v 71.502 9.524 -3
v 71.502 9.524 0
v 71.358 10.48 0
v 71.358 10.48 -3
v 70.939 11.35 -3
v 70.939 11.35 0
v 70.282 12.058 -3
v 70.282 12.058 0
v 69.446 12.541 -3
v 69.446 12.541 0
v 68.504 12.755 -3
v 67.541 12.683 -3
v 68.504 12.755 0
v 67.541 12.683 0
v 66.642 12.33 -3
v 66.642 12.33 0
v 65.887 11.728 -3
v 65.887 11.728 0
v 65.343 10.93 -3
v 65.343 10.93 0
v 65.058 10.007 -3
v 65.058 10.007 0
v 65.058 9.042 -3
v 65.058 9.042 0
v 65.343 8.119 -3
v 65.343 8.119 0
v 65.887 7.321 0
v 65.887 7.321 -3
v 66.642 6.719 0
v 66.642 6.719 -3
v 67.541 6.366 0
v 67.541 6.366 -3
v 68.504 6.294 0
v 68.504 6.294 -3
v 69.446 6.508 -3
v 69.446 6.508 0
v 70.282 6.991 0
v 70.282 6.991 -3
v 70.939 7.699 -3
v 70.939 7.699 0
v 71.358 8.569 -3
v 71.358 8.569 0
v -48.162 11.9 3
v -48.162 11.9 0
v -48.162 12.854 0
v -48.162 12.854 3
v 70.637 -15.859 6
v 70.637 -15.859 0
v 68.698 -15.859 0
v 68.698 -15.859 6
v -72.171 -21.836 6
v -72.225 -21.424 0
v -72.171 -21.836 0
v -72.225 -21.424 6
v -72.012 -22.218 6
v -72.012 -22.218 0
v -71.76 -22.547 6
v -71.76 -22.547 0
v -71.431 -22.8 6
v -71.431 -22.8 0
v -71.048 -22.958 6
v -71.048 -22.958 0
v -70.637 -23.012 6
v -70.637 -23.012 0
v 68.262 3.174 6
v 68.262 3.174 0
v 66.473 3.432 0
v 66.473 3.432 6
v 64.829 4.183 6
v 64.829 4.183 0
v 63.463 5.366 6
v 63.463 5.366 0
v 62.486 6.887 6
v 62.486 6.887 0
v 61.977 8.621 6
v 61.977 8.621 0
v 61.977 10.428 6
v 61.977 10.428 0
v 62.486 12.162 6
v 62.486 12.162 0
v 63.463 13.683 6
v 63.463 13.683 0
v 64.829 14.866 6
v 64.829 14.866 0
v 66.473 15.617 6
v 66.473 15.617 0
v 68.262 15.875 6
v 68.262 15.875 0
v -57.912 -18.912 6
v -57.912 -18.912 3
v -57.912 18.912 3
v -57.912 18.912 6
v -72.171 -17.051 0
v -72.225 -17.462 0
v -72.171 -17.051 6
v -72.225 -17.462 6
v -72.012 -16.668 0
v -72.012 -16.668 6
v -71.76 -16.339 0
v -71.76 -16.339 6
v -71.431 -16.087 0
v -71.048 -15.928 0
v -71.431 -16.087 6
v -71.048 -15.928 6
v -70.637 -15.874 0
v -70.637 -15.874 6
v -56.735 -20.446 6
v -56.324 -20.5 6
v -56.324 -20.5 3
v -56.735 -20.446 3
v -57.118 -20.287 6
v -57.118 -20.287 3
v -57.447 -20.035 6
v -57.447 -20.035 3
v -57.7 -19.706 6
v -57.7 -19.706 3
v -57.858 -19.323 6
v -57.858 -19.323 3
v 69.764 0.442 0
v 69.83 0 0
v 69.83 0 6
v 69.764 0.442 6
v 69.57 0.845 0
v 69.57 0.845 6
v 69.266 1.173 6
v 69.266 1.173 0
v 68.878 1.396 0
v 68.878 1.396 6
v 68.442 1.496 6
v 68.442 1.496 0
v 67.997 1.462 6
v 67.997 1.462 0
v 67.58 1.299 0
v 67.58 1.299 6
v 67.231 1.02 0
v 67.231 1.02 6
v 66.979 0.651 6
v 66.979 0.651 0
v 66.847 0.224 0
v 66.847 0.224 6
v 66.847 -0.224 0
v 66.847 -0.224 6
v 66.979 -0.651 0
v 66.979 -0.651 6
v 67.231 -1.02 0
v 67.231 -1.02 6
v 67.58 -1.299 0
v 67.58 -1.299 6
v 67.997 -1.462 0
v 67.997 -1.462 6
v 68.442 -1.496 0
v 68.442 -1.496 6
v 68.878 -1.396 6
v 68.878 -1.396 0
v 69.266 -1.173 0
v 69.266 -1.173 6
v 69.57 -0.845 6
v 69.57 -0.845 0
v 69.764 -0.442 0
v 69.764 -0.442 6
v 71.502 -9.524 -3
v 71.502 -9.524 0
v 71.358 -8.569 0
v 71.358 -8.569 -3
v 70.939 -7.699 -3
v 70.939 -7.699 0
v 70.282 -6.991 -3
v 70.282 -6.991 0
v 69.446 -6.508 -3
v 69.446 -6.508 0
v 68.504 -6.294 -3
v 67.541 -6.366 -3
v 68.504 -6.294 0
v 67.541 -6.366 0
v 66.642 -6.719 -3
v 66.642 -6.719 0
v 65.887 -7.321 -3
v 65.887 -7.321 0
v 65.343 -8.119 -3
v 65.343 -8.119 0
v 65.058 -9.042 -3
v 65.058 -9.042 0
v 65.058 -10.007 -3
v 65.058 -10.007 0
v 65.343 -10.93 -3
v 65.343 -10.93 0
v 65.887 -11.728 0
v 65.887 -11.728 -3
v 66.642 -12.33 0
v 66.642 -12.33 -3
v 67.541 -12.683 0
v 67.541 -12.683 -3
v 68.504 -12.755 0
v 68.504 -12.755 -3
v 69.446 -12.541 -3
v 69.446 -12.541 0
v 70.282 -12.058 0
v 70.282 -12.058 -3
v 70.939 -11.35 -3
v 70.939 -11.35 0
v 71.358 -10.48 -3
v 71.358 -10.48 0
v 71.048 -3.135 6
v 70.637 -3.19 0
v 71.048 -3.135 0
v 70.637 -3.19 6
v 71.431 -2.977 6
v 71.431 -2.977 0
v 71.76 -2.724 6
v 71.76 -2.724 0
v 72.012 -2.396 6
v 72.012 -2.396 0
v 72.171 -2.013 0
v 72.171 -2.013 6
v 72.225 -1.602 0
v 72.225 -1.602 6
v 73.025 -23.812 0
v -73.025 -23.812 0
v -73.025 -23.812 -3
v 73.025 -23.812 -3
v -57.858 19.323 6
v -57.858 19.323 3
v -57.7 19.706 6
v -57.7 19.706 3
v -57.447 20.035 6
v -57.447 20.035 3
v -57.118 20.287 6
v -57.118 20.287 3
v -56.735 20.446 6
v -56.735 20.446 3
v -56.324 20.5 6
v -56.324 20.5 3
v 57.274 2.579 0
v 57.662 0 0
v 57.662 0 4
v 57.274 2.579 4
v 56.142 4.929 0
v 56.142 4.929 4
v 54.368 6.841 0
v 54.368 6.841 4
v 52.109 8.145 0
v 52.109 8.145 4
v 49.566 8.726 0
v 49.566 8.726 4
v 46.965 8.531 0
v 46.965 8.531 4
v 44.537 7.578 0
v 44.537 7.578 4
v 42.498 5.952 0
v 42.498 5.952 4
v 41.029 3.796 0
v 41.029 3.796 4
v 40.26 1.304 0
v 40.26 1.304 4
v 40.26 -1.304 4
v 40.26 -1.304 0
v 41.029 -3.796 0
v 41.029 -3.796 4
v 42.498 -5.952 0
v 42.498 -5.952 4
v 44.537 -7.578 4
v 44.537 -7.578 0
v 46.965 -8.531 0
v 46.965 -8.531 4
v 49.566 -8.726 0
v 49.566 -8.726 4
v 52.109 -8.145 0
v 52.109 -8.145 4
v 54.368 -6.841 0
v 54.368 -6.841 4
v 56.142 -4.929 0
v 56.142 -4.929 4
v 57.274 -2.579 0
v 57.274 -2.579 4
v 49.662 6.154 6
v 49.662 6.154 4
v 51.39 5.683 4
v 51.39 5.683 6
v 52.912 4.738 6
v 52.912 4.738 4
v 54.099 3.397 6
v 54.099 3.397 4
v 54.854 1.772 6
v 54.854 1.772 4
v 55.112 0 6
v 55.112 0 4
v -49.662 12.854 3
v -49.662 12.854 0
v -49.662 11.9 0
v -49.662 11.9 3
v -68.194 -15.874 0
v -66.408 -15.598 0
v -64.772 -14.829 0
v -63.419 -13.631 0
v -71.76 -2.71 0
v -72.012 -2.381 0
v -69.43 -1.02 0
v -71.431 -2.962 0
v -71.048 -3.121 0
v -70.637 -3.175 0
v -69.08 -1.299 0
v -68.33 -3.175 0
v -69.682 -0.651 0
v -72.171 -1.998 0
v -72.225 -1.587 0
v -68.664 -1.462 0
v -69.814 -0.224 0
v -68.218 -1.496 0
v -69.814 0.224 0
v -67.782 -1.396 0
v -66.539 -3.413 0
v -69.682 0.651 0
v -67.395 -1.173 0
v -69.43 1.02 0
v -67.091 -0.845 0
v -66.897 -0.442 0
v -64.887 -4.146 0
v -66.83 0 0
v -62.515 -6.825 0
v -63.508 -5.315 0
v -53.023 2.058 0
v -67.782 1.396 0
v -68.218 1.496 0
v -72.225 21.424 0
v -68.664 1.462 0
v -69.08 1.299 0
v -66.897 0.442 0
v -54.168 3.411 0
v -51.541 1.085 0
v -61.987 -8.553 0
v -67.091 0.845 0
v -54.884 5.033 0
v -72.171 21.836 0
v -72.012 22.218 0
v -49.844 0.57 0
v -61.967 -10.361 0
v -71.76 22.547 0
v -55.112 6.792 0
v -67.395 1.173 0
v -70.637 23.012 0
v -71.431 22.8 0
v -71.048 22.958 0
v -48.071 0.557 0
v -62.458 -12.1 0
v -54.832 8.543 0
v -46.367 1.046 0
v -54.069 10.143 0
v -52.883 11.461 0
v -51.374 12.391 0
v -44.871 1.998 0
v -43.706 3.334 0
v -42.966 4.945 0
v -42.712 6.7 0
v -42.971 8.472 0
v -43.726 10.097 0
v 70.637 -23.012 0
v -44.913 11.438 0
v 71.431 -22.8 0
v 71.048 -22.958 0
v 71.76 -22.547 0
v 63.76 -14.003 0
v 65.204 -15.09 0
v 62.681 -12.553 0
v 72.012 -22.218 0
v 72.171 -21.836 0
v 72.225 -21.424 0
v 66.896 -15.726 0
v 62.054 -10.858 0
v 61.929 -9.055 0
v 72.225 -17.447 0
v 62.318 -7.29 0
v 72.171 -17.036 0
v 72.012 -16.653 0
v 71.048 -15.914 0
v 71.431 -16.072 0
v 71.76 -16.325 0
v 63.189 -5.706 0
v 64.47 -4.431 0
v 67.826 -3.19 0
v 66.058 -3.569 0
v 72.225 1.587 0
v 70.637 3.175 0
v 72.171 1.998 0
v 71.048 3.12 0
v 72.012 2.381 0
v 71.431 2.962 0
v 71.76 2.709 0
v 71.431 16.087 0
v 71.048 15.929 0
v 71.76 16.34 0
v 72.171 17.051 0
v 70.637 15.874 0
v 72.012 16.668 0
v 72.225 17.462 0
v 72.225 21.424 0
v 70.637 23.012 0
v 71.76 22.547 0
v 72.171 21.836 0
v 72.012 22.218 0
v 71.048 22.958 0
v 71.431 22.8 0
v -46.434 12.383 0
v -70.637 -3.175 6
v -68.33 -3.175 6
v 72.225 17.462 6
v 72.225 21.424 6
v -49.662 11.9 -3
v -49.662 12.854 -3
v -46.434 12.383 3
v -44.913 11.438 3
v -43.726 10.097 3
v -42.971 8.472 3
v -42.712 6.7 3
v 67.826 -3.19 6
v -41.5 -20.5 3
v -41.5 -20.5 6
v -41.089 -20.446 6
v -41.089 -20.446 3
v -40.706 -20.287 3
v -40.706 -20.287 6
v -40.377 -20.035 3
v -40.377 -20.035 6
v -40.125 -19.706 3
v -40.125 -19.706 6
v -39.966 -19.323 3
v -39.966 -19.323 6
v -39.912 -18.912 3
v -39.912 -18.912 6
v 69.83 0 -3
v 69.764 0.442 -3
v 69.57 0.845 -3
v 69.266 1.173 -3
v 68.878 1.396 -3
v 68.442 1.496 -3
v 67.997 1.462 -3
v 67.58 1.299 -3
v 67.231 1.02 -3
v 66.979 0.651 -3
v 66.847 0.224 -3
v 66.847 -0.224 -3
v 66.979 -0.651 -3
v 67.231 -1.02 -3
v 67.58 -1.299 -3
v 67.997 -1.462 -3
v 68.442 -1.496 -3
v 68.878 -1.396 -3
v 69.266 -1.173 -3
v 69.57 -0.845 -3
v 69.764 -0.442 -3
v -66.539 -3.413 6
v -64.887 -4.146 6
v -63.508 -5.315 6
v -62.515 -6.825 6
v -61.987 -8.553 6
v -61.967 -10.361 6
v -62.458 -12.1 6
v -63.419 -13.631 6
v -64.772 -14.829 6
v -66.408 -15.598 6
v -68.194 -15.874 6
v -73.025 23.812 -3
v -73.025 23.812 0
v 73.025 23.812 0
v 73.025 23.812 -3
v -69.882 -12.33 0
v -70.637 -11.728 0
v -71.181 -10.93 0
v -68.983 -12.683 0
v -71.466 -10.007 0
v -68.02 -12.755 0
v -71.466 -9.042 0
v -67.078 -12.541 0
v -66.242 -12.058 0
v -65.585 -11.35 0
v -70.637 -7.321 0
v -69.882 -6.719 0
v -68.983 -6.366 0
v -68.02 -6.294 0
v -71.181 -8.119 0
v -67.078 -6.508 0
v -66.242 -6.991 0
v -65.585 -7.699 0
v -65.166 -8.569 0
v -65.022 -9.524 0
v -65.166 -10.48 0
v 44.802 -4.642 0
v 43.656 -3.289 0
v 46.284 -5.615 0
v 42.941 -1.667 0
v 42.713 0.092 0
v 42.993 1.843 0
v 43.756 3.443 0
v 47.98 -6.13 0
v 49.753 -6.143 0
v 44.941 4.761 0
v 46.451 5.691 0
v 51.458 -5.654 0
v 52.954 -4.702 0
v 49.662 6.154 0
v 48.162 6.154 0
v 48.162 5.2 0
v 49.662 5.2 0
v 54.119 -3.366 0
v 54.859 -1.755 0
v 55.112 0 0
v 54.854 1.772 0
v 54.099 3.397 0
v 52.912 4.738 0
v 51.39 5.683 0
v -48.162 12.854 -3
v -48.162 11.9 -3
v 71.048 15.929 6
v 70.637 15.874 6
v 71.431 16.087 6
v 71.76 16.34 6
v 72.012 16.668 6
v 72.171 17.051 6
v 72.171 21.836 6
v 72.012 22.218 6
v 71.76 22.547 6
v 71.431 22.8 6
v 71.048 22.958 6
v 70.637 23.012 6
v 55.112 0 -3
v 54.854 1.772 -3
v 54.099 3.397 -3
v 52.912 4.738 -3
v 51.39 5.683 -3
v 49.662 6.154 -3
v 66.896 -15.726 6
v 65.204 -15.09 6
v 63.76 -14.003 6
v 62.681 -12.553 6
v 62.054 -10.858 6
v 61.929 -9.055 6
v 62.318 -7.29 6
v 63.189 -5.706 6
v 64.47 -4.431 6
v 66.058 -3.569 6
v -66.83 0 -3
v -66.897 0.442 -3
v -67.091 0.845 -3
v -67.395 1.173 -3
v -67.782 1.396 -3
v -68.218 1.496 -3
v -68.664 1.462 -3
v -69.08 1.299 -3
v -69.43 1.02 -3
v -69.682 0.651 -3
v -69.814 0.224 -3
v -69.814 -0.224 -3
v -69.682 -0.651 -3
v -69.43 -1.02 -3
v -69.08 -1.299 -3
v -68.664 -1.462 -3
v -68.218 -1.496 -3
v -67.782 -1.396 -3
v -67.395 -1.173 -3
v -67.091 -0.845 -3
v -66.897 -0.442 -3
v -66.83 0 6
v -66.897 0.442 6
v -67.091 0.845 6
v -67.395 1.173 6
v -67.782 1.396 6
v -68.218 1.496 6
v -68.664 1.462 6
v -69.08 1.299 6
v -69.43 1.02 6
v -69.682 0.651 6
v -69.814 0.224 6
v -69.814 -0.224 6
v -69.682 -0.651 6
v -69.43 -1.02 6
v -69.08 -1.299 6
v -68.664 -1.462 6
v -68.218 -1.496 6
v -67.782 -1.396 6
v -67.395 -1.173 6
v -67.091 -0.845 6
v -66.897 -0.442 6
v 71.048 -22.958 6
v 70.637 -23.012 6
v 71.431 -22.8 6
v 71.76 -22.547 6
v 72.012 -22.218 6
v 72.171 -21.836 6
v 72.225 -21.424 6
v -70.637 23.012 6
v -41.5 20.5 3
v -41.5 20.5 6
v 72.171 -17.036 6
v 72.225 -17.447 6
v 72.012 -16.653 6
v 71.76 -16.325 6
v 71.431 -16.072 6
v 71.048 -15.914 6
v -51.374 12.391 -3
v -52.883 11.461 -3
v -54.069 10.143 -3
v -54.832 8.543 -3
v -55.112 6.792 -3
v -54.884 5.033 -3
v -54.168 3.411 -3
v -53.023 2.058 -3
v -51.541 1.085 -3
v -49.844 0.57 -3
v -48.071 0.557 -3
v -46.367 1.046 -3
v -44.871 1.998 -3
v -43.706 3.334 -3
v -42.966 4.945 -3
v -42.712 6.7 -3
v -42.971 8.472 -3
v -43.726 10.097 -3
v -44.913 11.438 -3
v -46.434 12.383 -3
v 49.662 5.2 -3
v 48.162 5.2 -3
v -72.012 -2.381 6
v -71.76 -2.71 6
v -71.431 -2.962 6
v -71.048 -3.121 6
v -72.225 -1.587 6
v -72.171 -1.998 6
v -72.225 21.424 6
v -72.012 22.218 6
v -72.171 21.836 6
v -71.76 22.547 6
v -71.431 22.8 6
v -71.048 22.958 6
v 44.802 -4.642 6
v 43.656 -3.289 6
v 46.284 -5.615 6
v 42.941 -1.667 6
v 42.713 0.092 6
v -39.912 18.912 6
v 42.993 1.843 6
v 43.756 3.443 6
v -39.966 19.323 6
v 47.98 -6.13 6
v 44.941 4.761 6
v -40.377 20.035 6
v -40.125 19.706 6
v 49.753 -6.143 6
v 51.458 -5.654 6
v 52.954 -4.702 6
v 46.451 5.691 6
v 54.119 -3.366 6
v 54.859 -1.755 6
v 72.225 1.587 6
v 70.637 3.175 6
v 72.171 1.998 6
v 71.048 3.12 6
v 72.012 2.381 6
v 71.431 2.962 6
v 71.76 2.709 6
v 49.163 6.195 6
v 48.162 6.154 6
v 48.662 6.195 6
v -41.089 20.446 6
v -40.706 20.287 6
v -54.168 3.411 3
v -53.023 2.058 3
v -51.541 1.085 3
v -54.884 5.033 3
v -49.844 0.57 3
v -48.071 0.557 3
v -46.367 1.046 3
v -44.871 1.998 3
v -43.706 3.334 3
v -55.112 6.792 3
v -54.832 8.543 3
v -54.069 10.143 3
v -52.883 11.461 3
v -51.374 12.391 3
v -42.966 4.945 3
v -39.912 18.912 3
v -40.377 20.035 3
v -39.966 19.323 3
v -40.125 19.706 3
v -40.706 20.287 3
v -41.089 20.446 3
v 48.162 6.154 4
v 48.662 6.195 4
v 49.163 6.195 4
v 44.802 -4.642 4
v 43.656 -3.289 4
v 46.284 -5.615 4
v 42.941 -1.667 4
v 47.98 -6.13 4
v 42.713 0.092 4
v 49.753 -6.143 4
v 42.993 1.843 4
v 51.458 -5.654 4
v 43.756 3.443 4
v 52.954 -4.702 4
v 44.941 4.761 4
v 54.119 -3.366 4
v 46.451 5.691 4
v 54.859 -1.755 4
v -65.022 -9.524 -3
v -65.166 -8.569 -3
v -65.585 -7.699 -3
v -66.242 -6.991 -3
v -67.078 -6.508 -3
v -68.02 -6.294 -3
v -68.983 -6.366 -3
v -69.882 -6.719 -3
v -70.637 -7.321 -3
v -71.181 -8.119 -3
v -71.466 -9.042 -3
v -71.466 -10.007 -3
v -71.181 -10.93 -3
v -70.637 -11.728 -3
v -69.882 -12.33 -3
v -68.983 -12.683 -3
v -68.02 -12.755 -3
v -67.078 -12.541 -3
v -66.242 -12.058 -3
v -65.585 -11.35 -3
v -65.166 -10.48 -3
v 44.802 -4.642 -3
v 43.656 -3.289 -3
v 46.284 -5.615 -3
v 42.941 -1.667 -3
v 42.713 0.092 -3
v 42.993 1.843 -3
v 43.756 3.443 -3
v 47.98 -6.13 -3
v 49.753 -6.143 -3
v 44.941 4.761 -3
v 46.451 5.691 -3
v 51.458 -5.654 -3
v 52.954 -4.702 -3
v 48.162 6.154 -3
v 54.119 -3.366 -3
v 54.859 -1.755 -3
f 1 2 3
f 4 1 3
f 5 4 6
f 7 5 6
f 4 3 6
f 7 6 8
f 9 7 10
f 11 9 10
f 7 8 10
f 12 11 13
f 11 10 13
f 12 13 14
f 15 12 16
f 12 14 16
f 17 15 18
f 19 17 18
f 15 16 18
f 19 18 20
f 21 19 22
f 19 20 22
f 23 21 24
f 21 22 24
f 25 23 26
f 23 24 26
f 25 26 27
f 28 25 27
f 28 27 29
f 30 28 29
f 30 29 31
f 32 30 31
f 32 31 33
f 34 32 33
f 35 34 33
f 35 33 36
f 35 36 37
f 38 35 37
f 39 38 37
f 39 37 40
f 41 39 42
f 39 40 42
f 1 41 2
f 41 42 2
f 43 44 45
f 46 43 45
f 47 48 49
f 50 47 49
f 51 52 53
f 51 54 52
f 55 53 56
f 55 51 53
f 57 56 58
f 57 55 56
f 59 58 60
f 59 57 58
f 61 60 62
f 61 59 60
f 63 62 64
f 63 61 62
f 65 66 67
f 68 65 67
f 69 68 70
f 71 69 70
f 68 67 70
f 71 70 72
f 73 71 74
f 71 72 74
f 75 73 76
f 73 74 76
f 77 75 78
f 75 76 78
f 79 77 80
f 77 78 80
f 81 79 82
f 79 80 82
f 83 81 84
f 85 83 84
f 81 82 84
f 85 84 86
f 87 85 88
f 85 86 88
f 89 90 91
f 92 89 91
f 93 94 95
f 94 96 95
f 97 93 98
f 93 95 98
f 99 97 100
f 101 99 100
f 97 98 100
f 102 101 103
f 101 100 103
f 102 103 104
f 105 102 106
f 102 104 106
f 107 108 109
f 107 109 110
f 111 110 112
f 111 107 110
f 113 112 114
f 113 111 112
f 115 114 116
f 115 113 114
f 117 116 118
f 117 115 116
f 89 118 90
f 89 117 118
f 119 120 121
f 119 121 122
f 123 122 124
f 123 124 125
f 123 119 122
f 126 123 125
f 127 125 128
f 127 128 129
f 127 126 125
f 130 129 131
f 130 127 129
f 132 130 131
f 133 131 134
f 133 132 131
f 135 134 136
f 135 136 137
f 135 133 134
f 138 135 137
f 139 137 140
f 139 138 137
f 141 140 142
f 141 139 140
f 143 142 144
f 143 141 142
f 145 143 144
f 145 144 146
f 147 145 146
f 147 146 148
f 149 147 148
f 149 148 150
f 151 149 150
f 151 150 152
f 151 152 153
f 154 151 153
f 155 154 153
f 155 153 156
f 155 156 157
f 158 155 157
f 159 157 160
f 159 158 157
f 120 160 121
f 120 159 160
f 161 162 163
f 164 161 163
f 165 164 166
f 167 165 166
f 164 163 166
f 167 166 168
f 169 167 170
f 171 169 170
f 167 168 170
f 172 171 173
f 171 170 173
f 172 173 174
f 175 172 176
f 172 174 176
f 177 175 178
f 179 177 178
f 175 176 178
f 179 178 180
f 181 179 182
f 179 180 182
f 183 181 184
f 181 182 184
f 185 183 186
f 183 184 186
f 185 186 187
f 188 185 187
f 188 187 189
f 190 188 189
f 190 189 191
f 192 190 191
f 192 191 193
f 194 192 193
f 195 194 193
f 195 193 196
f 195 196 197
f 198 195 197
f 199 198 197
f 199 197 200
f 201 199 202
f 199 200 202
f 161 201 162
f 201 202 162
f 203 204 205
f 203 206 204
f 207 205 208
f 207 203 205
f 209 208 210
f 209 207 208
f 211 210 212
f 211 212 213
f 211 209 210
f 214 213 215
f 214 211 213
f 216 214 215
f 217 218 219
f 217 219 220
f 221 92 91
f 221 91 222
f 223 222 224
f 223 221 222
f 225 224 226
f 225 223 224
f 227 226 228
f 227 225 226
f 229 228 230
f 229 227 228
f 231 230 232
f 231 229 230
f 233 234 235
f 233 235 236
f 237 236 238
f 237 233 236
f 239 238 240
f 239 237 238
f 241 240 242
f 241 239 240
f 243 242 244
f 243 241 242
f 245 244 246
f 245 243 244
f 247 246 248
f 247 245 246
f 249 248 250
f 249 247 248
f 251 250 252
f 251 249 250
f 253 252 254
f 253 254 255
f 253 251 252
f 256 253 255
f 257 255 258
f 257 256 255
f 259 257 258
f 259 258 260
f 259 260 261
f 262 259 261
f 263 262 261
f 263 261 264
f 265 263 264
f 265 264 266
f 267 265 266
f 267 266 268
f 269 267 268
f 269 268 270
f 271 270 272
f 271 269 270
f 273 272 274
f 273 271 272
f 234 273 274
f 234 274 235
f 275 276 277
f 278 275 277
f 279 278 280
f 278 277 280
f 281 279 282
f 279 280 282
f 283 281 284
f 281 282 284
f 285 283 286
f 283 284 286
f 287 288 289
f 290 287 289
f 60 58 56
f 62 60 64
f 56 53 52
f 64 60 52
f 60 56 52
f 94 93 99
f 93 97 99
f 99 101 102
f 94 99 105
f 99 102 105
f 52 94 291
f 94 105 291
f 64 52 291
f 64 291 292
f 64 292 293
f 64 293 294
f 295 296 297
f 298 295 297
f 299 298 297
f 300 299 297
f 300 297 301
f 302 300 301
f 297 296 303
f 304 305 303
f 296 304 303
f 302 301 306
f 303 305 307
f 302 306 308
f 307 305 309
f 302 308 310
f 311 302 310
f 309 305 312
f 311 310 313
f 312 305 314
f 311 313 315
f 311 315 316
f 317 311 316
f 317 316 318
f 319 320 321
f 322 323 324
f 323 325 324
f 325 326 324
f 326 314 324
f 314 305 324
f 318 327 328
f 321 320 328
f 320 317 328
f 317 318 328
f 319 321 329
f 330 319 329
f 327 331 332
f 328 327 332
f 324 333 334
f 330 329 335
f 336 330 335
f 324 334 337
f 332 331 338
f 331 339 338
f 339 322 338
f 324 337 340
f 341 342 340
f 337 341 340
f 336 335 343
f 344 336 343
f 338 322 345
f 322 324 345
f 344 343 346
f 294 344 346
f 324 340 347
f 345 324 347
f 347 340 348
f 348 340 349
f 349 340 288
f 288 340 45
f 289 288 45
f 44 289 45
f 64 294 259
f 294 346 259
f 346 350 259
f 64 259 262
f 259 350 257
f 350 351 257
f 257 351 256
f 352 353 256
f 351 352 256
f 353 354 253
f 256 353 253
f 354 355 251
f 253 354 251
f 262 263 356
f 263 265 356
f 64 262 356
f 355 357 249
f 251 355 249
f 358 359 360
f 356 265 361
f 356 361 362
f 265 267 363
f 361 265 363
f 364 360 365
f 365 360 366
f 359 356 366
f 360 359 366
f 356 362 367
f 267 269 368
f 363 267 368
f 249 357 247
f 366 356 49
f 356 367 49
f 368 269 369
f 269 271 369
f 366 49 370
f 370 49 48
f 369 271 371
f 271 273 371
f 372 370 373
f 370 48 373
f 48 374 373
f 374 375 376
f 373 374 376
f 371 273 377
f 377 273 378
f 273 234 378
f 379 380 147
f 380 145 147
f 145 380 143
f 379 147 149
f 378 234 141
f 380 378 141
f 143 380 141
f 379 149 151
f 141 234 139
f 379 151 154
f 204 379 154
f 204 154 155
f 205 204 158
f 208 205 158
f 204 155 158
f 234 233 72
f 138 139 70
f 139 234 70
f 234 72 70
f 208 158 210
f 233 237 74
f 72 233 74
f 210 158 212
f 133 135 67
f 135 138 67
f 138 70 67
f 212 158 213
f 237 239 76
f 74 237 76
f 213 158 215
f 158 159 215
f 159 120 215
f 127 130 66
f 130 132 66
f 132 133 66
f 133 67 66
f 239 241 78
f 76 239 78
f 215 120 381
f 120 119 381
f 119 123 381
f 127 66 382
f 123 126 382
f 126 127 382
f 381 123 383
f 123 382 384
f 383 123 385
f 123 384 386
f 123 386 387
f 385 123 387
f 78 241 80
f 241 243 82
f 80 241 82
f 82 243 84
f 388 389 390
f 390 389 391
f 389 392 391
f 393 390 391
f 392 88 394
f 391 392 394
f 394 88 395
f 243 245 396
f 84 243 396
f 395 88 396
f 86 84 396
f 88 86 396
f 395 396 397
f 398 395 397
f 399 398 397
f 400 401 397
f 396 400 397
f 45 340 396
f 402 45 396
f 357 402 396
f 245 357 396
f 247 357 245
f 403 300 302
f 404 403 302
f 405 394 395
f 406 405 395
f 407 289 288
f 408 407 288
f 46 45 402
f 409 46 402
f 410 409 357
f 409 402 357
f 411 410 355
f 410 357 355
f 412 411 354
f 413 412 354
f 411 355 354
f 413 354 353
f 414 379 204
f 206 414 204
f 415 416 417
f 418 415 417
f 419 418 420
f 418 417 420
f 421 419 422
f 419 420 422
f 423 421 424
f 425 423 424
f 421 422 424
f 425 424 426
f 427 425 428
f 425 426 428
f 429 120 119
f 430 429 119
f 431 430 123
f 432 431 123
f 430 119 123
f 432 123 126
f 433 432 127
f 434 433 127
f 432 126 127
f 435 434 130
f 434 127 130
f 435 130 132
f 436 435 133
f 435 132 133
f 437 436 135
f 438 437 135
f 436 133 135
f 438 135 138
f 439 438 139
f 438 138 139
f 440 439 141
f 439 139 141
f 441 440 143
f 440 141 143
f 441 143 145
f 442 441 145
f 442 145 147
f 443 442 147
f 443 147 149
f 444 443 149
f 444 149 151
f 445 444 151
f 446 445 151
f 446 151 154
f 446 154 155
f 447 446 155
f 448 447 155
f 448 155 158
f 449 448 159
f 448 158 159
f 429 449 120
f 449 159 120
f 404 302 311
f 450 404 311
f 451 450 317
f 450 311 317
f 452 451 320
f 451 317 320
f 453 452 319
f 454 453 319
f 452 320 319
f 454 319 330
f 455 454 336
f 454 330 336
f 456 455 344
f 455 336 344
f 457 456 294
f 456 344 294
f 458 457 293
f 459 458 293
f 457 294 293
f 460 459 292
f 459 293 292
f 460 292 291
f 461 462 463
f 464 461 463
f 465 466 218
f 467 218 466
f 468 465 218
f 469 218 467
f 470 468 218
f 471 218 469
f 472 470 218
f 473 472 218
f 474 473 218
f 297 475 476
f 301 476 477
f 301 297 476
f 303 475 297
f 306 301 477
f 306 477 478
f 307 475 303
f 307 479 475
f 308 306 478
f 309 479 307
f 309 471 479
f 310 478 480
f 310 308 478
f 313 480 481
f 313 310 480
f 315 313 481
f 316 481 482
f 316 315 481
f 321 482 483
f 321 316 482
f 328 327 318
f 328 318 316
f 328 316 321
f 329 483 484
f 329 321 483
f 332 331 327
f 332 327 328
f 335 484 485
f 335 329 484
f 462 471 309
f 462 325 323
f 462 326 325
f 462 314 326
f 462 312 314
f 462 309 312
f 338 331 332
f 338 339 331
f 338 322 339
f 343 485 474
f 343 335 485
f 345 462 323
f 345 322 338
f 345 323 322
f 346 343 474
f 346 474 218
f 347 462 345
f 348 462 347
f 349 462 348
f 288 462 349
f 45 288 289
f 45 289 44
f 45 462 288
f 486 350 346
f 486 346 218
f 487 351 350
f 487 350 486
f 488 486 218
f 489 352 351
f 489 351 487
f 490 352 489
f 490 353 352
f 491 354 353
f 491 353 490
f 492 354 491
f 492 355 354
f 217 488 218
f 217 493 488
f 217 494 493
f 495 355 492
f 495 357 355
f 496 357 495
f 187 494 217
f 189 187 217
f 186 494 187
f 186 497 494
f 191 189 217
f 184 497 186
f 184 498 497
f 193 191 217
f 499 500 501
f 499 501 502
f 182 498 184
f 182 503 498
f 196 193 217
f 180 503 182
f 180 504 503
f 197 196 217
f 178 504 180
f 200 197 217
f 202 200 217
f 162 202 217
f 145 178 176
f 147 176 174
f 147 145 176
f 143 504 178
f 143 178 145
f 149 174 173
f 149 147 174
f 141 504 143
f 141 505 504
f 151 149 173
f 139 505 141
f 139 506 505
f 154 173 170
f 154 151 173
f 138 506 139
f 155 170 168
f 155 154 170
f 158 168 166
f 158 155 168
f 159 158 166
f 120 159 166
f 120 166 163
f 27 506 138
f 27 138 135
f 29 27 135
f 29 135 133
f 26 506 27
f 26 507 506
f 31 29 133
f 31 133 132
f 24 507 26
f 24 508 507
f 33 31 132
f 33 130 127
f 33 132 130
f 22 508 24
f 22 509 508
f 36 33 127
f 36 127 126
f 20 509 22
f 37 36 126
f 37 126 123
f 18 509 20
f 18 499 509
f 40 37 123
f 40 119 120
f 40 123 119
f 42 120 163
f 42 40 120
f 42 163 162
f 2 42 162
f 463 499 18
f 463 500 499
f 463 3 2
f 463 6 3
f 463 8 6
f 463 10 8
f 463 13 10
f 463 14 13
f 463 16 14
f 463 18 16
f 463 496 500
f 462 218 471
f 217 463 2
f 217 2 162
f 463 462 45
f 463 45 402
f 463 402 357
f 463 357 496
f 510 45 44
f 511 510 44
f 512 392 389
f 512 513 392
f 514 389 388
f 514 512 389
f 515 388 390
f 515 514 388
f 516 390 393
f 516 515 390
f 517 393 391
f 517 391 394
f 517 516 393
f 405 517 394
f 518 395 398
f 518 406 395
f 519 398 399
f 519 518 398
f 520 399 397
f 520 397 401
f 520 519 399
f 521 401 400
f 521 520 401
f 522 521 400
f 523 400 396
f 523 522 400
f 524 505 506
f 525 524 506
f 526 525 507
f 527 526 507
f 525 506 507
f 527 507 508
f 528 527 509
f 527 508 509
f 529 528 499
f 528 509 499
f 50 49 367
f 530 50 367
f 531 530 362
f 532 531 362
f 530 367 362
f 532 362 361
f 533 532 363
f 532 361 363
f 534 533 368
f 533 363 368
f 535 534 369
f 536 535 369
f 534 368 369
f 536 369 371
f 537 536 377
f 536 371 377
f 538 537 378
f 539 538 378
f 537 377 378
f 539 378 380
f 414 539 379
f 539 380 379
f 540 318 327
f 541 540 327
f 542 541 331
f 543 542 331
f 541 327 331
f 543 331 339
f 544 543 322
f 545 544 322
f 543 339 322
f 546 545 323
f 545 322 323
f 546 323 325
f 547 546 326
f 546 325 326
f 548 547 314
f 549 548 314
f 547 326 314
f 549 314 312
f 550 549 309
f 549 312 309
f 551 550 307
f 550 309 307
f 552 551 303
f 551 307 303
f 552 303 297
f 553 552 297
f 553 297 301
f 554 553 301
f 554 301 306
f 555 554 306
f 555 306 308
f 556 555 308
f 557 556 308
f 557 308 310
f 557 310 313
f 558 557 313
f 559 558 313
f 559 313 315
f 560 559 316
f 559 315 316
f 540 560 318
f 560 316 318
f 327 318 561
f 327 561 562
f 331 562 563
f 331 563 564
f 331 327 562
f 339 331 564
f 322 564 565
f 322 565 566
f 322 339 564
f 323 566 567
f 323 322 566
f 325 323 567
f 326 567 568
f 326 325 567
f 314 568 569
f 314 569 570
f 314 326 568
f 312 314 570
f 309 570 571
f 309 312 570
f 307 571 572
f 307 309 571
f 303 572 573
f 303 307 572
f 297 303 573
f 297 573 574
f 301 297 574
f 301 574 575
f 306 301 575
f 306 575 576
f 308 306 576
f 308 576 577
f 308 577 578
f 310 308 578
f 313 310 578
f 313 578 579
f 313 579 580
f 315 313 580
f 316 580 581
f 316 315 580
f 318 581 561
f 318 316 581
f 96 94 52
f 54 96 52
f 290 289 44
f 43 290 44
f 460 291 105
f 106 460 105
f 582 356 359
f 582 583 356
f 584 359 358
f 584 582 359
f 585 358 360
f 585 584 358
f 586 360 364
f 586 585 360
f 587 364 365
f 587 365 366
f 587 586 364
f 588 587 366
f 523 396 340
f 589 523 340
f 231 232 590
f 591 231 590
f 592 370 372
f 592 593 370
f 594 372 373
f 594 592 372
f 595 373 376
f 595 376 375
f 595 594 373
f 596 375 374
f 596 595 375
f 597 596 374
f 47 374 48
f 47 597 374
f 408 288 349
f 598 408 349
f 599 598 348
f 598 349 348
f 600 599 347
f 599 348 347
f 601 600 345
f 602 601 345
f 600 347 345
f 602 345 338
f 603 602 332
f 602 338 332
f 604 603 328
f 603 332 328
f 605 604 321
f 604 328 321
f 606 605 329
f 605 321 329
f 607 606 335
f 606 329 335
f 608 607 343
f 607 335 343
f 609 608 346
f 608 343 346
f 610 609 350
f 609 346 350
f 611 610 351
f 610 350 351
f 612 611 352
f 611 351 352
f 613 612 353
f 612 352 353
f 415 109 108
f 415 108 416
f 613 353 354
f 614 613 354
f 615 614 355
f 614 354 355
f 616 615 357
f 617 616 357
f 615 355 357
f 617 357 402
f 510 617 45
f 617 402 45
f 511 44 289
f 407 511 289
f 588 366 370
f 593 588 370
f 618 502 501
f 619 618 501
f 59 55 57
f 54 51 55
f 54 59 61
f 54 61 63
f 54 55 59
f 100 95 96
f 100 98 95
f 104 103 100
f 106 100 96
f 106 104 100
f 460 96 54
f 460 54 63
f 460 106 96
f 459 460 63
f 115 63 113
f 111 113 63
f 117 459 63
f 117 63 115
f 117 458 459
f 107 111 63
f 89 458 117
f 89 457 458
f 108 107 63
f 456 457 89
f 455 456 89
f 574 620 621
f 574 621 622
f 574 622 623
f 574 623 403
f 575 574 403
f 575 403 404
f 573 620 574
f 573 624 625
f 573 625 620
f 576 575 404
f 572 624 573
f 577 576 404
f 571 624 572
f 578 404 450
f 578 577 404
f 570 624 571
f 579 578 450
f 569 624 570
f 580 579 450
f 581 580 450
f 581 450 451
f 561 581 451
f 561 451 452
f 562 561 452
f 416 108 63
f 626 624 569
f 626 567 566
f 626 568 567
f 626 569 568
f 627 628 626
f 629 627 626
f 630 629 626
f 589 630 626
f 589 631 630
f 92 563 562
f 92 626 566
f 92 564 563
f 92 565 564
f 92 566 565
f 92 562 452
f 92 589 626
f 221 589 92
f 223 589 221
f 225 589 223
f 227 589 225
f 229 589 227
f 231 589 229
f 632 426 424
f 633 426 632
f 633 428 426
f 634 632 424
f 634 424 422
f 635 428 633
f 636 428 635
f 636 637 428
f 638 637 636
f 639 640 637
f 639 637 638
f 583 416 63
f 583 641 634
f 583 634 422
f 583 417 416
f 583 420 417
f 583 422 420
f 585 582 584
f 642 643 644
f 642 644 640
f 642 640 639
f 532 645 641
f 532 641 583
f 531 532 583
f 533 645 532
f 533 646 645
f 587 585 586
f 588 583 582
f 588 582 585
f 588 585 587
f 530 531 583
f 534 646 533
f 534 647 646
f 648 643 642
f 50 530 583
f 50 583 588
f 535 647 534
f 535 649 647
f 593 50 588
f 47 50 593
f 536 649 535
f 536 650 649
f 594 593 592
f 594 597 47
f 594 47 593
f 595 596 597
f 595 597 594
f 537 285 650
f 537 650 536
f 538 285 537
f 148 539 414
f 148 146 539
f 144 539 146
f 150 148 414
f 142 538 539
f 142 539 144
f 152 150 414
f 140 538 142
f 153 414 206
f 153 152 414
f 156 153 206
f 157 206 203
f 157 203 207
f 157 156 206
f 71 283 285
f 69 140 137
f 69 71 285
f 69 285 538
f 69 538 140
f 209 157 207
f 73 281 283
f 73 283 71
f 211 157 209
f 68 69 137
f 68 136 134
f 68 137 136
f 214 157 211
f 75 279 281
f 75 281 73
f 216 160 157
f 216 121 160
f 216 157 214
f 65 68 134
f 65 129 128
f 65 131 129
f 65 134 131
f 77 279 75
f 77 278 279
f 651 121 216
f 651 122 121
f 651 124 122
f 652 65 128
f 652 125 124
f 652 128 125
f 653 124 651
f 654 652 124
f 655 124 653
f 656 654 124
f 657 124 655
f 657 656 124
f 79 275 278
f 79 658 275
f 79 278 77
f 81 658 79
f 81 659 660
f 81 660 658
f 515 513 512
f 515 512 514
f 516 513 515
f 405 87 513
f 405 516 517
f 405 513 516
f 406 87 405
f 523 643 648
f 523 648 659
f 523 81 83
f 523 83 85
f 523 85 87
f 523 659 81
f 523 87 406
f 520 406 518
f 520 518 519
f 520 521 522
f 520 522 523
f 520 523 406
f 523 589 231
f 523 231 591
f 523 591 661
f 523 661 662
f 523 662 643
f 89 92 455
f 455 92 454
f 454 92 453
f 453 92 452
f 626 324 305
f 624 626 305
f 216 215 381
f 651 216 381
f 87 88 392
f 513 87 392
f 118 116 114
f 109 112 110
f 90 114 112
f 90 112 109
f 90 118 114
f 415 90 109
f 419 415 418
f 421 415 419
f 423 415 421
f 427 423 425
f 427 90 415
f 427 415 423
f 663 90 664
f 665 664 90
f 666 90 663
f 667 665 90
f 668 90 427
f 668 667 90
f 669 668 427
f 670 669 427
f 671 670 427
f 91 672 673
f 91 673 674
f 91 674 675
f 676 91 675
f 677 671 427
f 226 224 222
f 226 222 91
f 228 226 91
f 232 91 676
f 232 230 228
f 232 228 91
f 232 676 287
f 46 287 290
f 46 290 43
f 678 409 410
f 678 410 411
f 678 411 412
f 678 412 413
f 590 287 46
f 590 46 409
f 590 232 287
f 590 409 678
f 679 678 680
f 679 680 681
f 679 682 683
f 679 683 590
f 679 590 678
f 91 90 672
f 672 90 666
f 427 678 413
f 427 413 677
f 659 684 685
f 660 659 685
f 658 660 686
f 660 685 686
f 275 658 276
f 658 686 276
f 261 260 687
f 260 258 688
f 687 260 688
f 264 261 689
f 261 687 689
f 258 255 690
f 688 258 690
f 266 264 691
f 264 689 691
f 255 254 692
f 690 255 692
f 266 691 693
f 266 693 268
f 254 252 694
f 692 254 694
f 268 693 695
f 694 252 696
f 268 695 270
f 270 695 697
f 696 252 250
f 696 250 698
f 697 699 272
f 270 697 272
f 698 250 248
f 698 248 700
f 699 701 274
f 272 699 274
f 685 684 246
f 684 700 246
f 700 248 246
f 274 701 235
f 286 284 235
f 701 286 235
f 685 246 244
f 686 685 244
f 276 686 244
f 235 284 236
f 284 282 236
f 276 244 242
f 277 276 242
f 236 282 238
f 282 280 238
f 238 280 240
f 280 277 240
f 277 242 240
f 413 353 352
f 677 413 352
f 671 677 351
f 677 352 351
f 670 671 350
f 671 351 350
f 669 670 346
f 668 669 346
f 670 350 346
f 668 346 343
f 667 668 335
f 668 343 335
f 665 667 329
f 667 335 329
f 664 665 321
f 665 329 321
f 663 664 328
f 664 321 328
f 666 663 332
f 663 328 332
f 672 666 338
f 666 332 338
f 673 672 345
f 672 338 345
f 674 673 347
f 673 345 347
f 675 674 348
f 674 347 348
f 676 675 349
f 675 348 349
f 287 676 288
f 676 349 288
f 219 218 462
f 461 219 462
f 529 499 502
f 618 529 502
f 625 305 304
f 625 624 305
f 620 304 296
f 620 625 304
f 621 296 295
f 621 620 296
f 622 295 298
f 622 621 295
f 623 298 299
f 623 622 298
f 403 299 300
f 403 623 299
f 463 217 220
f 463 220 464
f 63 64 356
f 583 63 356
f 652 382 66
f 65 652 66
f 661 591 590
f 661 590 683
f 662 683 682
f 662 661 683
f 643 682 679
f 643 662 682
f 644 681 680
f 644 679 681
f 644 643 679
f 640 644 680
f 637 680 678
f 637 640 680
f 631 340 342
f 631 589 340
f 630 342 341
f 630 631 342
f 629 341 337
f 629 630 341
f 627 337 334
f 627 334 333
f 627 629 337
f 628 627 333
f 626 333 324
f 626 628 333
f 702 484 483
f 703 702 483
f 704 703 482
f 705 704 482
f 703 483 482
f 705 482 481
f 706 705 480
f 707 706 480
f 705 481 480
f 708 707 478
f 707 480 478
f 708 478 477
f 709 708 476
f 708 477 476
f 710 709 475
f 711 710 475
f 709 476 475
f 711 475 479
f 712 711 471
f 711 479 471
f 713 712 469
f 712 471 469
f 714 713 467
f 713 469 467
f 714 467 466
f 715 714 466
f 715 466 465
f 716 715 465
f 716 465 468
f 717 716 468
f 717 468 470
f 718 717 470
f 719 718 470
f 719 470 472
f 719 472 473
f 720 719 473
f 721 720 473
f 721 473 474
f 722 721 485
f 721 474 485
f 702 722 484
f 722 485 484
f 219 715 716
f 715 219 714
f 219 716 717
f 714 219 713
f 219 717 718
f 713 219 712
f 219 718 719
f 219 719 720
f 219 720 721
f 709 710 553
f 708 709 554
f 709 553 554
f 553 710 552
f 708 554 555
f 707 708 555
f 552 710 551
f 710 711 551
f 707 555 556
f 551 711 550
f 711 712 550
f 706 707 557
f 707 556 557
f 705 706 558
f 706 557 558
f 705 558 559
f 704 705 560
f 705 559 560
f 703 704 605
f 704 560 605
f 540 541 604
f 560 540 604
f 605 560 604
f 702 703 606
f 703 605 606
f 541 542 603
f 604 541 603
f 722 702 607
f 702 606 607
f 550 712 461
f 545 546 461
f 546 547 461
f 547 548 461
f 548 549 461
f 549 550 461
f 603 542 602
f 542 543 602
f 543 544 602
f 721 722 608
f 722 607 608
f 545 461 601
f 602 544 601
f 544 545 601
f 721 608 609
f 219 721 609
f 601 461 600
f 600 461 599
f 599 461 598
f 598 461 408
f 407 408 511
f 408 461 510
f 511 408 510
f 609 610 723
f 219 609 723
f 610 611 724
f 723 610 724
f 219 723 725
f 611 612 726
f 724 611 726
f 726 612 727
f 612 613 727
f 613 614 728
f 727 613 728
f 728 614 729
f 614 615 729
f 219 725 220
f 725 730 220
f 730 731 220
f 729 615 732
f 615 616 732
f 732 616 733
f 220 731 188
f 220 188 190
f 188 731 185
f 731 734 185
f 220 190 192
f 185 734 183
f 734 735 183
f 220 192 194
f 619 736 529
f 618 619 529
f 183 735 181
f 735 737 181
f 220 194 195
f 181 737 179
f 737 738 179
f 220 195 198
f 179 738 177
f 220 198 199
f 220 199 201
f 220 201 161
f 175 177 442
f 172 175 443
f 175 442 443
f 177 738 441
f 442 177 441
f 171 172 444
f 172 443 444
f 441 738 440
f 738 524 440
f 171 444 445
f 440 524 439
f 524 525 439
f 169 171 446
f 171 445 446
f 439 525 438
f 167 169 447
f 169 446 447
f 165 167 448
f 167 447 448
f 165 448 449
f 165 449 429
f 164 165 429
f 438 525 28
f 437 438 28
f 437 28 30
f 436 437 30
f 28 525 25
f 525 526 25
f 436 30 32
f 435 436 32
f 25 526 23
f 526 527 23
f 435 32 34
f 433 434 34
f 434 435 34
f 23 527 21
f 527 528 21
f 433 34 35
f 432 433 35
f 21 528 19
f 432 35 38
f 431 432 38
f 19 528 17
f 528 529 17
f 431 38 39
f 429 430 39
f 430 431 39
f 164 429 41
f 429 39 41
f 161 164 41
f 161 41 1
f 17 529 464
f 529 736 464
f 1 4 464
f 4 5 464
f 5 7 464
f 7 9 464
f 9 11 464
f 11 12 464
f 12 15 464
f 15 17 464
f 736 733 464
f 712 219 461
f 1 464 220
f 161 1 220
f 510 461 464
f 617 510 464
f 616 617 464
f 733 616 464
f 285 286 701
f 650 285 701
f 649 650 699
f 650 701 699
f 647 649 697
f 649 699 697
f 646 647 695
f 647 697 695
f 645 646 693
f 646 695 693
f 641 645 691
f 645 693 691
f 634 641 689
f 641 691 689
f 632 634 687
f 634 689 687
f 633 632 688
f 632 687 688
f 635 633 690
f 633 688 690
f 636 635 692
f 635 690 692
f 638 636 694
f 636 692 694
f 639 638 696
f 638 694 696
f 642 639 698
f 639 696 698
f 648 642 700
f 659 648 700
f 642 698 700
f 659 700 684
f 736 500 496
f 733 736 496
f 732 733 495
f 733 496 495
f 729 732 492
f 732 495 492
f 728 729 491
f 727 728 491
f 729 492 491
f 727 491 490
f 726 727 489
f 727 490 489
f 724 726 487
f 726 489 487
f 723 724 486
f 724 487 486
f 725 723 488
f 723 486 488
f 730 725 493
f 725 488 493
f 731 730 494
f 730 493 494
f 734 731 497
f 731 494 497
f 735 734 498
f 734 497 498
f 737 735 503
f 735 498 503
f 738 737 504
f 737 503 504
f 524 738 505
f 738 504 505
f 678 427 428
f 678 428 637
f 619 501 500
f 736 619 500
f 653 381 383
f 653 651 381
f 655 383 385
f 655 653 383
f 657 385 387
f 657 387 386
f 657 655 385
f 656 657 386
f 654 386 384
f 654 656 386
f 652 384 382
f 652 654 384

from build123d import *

# Parameters (mm, degrees)
F0_W      = 146.05
F0_H      = 47.625
F0_R      = 3.24
F0_R_2    = 1.5
F1_DEPTH  = 3
F3_DEPTH  = 25
F2_R      = 1.5
F2_W      = 18
F2_H      = 41
F4_DEPTH  = 6
F5_R      = 1.588
F6_R      = 1.5
F7_DEPTH  = 9.001
F8_R      = 8.75
F9_DEPTH  = 4
F11_DEPTH = 3


# Not quite as in the source:
# - ends of sketch curves that miss each other by under 0.0002 mm in the source are joined


with BuildPart() as f1:
    # F0 (on Top) → F1 (new body)
    with BuildSketch(Plane.XY):
        Rectangle(F0_W, F0_H)
        with Locations((-68.262, -9.5245)):
            Circle(F0_R, mode=Mode.SUBTRACT)
        with Locations((68.262, -9.5245)):
            Circle(F0_R, mode=Mode.SUBTRACT)
        with BuildLine():
            Line((72.225, -15.859485), (72.225, -23.0125))
            Line((72.225, -23.0125), (-72.225, -23.0125))
            Line((-72.225, -23.0125), (-72.225, -15.874133))
            Line((-72.225, -15.874133), (-68.193705, -15.874133))
            ThreePointArc((-68.193705, -15.874133), (-61.912367271, -9.4562050029), (-68.3302949971, -3.174867271))
            Line((-68.3302949971, -3.174867271), (-72.225, -3.174867))
            Line((-72.225, -3.174867), (-72.225, 3.1745))
            Line((-72.225, 3.1745), (-72.225, 15.8745))
            Line((-72.225, 15.8745), (-72.225, 23.0125))
            Line((-72.225, 23.0125), (72.225, 23.0125))
            Line((72.225, 23.0125), (72.225, 15.8745))
            Line((72.225, 15.8745), (68.262, 15.8745))
            ThreePointArc((68.262, 15.8745), (61.912, 9.5245), (68.262, 3.1745))
            Line((68.262, 3.1745), (72.225, 3.1745))
            Line((72.225, 3.1745), (72.225, -3.189515))
            Line((72.225, -3.189515), (67.825573, -3.189515))
            ThreePointArc((67.825573, -3.189515), (61.9270152731, -9.9609269812), (68.6984269812, -15.8594847269))
            Line((68.6984269812, -15.8594847269), (72.225, -15.859485))
        make_face(mode=Mode.SUBTRACT)
        with Locations((68.262, 9.5245)):
            Circle(F0_R, mode=Mode.SUBTRACT)
        with BuildLine():
            Line((-72.225, -23.0125), (72.225, -23.0125))
            Line((72.225, -23.0125), (72.225, -15.859485))
            Line((72.225, -15.859485), (68.698427, -15.859485))
            ThreePointArc((68.698427, -15.859485), (61.9270152731, -9.9609269812), (67.8255730188, -3.1895152731))
            Line((67.8255730188, -3.1895152731), (72.225, -3.189515))
            Line((72.225, -3.189515), (72.225, 3.1745))
            Line((72.225, 3.1745), (68.262, 3.1745))
            ThreePointArc((68.262, 3.1745), (61.912, 9.5245), (68.262, 15.8745))
            Line((68.262, 15.8745), (72.225, 15.8745))
            Line((72.225, 15.8745), (72.225, 23.0125))
            Line((72.225, 23.0125), (-72.225, 23.0125))
            Line((-72.225, 23.0125), (-72.225, 15.8745))
            Line((-72.225, 15.8745), (-72.225, 3.1745))
            Line((-72.225, 3.1745), (-72.225, -3.174867))
            Line((-72.225, -3.174867), (-68.330295, -3.174867))
            ThreePointArc((-68.330295, -3.174867), (-61.912367271, -9.4562050029), (-68.1937050029, -15.874132729))
            Line((-68.1937050029, -15.874132729), (-72.225, -15.874133))
            Line((-72.225, -15.874133), (-72.225, -23.0125))
        make_face()
        with Locations((-68.330295, 0)):
            Circle(F0_R_2, mode=Mode.SUBTRACT)
        with Locations((68.330295, 0)):
            Circle(F0_R_2, mode=Mode.SUBTRACT)
    extrude(amount=-F1_DEPTH)

    # F2 (on face) → F3 (cut)
    with BuildSketch(Plane.XY):
        with BuildLine():
            ThreePointArc((-49.662367271, 12.8544699203), (-53.0227200539, 2.0583408139), (-42.712367271, 6.7))
            ThreePointArc((-42.712367271, 6.7), (-44.2707080849, 10.8103527829), (-48.162367271, 12.8544699203))
            Line((-48.162367271, 12.8544699203), (-48.162367271, 11.9))
            Line((-48.162367271, 11.9), (-49.662367271, 11.9))
            Line((-49.662367271, 11.9), (-49.662367271, 12.8544699203))
        make_face()
        with BuildLine():
            ThreePointArc((48.16237, 6.1544699203), (44.8020172171, -4.6416591861), (55.11237, 0))
            ThreePointArc((55.11237, 0), (53.5540291861, 4.1103527829), (49.66237, 6.1544699203))
            Line((49.66237, 6.1544699203), (49.66237, 5.2))
            Line((49.66237, 5.2), (48.16237, 5.2))
            Line((48.16237, 5.2), (48.16237, 6.1544699203))
        make_face()
    extrude(amount=-F3_DEPTH, mode=Mode.SUBTRACT)

    # F6 (on face) → F7 (cut, through all)
    with BuildSketch(Plane.XY.offset(6)):
        with Locations((-68.3302949971, 0)):
            Circle(F6_R)
        with Locations((68.3302949971, 0)):
            Circle(F6_R)
    extrude(amount=-F7_DEPTH, mode=Mode.SUBTRACT)


with BuildPart() as f4:
    # F2 (on face) → F4 (new body)
    with BuildSketch(Plane.XY):
        with BuildLine():
            Line((-72.225, -15.874133), (-72.225, -23.0125))
            Line((-72.225, -23.0125), (72.225, -23.0125))
            Line((72.225, -23.0125), (72.225, -15.859485))
            Line((72.225, -15.859485), (68.698427, -15.859485))
            ThreePointArc((68.698427, -15.859485), (61.9270152731, -9.9609269812), (67.8255730188, -3.1895152731))
            Line((67.8255730188, -3.1895152731), (72.225, -3.189515))
            Line((72.225, -3.189515), (72.225, 3.1745))
            Line((72.225, 3.1745), (68.262, 3.1745))
            ThreePointArc((68.262, 3.1745), (61.912, 9.5245), (68.262, 15.8745))
            Line((68.262, 15.8745), (72.225, 15.8745))
            Line((72.225, 15.8745), (72.225, 23.0125))
            Line((72.225, 23.0125), (-72.225, 23.0125))
            Line((-72.225, 23.0125), (-72.225, 15.8745))
            Line((-72.225, 15.8745), (-72.225, 3.1745))
            Line((-72.225, 3.1745), (-72.225, -3.174867))
            Line((-72.225, -3.174867), (-68.330295, -3.174867))
            ThreePointArc((-68.330295, -3.174867), (-61.912367271, -9.4562050029), (-68.1937050029, -15.874132729))
            Line((-68.1937050029, -15.874132729), (-72.225, -15.874133))
        make_face()
        with Locations((-68.330295, 0)):
            Circle(F2_R, mode=Mode.SUBTRACT)
        with Locations((-48.912367271, 0)):
            Rectangle(F2_W, F2_H, mode=Mode.SUBTRACT)
        with BuildLine():
            ThreePointArc((49.66237, 6.1544699203), (53.5540291861, 4.1103527829), (55.11237, 0))
            ThreePointArc((55.11237, 0), (44.8020172171, -4.6416591861), (48.16237, 6.1544699203))
            Line((48.16237, 6.1544699203), (48.16237, 7.2))
            Line((48.16237, 7.2), (49.66237, 7.2))
            Line((49.66237, 7.2), (49.66237, 6.1544699203))
        make_face(mode=Mode.SUBTRACT)
        with Locations((68.330295, 0)):
            Circle(F2_R, mode=Mode.SUBTRACT)
        with BuildLine():
            ThreePointArc((48.16237, 6.1544699203), (48.91237, 6.2), (49.66237, 6.1544699203))
            Line((49.66237, 6.1544699203), (49.66237, 7.2))
            Line((49.66237, 7.2), (48.16237, 7.2))
            Line((48.16237, 7.2), (48.16237, 6.1544699203))
        make_face()
    extrude(amount=F4_DEPTH)

    # F5
    f5_edges = [f4.edges().sort_by_distance(p)[0] for p in [
        (-72.225, -23.0125, 3),
        (-72.225, -15.874133, 3),
        (-72.225, -3.174867, 3),
        (-72.225, 23.0125, 3),
        (72.225, -23.0125, 3),
        (72.225, -15.859485, 3),
        (72.225, -3.189515, 3),
        (72.225, 3.1745, 3),
        (72.225, 15.8745, 3),
        (72.225, 23.0125, 3),
        (-57.912367, 20.5, 3),
        (-39.912367, 20.5, 3),
        (-39.912367, -20.5, 3),
        (-57.912367, -20.5, 3),
    ]]
    fillet(f5_edges, radius=F5_R)

    # F8 (on face) → F9 (cut)
    with BuildSketch(Plane.XY):
        with Locations((48.91237, 0)):
            Circle(F8_R)
    extrude(amount=F9_DEPTH, mode=Mode.SUBTRACT)

    # F2 (on face) + F10 (on face) → F11 (join)
    with BuildSketch(Plane.XY):
        with Locations((-48.912367271, 0)):
            Rectangle(F2_W, F2_H)
        with BuildLine():
            ThreePointArc((-48.162367271, 12.8544699203), (-44.2707080849, 10.8103527829), (-42.712367271, 6.7))
            ThreePointArc((-42.712367271, 6.7), (-53.0227200539, 2.0583408139), (-49.662367271, 12.8544699203))
            Line((-49.662367271, 12.8544699203), (-49.662367271, 13.9))
            Line((-49.662367271, 13.9), (-48.162367271, 13.9))
            Line((-48.162367271, 13.9), (-48.162367271, 12.8544699203))
        make_face(mode=Mode.SUBTRACT)
    with BuildSketch(Plane.XY):
        with BuildLine():
            ThreePointArc((-49.662367271, 12.8544699203), (-48.912367271, 12.9), (-48.162367271, 12.8544699203))
            Line((-48.162367271, 12.8544699203), (-48.162367271, 13.9))
            Line((-48.162367271, 13.9), (-49.662367271, 13.9))
            Line((-49.662367271, 13.9), (-49.662367271, 12.8544699203))
        make_face()
        with BuildLine():
            Line((-48.162367271, 11.9), (-48.162367271, 12.8544699203))
            ThreePointArc((-48.162367271, 12.8544699203), (-48.912367271, 12.9), (-49.662367271, 12.8544699203))
            Line((-49.662367271, 12.8544699203), (-49.662367271, 11.9))
            Line((-49.662367271, 11.9), (-48.162367271, 11.9))
        make_face()
    extrude(amount=F11_DEPTH)


solid = Compound([f1.part, f4.part])
